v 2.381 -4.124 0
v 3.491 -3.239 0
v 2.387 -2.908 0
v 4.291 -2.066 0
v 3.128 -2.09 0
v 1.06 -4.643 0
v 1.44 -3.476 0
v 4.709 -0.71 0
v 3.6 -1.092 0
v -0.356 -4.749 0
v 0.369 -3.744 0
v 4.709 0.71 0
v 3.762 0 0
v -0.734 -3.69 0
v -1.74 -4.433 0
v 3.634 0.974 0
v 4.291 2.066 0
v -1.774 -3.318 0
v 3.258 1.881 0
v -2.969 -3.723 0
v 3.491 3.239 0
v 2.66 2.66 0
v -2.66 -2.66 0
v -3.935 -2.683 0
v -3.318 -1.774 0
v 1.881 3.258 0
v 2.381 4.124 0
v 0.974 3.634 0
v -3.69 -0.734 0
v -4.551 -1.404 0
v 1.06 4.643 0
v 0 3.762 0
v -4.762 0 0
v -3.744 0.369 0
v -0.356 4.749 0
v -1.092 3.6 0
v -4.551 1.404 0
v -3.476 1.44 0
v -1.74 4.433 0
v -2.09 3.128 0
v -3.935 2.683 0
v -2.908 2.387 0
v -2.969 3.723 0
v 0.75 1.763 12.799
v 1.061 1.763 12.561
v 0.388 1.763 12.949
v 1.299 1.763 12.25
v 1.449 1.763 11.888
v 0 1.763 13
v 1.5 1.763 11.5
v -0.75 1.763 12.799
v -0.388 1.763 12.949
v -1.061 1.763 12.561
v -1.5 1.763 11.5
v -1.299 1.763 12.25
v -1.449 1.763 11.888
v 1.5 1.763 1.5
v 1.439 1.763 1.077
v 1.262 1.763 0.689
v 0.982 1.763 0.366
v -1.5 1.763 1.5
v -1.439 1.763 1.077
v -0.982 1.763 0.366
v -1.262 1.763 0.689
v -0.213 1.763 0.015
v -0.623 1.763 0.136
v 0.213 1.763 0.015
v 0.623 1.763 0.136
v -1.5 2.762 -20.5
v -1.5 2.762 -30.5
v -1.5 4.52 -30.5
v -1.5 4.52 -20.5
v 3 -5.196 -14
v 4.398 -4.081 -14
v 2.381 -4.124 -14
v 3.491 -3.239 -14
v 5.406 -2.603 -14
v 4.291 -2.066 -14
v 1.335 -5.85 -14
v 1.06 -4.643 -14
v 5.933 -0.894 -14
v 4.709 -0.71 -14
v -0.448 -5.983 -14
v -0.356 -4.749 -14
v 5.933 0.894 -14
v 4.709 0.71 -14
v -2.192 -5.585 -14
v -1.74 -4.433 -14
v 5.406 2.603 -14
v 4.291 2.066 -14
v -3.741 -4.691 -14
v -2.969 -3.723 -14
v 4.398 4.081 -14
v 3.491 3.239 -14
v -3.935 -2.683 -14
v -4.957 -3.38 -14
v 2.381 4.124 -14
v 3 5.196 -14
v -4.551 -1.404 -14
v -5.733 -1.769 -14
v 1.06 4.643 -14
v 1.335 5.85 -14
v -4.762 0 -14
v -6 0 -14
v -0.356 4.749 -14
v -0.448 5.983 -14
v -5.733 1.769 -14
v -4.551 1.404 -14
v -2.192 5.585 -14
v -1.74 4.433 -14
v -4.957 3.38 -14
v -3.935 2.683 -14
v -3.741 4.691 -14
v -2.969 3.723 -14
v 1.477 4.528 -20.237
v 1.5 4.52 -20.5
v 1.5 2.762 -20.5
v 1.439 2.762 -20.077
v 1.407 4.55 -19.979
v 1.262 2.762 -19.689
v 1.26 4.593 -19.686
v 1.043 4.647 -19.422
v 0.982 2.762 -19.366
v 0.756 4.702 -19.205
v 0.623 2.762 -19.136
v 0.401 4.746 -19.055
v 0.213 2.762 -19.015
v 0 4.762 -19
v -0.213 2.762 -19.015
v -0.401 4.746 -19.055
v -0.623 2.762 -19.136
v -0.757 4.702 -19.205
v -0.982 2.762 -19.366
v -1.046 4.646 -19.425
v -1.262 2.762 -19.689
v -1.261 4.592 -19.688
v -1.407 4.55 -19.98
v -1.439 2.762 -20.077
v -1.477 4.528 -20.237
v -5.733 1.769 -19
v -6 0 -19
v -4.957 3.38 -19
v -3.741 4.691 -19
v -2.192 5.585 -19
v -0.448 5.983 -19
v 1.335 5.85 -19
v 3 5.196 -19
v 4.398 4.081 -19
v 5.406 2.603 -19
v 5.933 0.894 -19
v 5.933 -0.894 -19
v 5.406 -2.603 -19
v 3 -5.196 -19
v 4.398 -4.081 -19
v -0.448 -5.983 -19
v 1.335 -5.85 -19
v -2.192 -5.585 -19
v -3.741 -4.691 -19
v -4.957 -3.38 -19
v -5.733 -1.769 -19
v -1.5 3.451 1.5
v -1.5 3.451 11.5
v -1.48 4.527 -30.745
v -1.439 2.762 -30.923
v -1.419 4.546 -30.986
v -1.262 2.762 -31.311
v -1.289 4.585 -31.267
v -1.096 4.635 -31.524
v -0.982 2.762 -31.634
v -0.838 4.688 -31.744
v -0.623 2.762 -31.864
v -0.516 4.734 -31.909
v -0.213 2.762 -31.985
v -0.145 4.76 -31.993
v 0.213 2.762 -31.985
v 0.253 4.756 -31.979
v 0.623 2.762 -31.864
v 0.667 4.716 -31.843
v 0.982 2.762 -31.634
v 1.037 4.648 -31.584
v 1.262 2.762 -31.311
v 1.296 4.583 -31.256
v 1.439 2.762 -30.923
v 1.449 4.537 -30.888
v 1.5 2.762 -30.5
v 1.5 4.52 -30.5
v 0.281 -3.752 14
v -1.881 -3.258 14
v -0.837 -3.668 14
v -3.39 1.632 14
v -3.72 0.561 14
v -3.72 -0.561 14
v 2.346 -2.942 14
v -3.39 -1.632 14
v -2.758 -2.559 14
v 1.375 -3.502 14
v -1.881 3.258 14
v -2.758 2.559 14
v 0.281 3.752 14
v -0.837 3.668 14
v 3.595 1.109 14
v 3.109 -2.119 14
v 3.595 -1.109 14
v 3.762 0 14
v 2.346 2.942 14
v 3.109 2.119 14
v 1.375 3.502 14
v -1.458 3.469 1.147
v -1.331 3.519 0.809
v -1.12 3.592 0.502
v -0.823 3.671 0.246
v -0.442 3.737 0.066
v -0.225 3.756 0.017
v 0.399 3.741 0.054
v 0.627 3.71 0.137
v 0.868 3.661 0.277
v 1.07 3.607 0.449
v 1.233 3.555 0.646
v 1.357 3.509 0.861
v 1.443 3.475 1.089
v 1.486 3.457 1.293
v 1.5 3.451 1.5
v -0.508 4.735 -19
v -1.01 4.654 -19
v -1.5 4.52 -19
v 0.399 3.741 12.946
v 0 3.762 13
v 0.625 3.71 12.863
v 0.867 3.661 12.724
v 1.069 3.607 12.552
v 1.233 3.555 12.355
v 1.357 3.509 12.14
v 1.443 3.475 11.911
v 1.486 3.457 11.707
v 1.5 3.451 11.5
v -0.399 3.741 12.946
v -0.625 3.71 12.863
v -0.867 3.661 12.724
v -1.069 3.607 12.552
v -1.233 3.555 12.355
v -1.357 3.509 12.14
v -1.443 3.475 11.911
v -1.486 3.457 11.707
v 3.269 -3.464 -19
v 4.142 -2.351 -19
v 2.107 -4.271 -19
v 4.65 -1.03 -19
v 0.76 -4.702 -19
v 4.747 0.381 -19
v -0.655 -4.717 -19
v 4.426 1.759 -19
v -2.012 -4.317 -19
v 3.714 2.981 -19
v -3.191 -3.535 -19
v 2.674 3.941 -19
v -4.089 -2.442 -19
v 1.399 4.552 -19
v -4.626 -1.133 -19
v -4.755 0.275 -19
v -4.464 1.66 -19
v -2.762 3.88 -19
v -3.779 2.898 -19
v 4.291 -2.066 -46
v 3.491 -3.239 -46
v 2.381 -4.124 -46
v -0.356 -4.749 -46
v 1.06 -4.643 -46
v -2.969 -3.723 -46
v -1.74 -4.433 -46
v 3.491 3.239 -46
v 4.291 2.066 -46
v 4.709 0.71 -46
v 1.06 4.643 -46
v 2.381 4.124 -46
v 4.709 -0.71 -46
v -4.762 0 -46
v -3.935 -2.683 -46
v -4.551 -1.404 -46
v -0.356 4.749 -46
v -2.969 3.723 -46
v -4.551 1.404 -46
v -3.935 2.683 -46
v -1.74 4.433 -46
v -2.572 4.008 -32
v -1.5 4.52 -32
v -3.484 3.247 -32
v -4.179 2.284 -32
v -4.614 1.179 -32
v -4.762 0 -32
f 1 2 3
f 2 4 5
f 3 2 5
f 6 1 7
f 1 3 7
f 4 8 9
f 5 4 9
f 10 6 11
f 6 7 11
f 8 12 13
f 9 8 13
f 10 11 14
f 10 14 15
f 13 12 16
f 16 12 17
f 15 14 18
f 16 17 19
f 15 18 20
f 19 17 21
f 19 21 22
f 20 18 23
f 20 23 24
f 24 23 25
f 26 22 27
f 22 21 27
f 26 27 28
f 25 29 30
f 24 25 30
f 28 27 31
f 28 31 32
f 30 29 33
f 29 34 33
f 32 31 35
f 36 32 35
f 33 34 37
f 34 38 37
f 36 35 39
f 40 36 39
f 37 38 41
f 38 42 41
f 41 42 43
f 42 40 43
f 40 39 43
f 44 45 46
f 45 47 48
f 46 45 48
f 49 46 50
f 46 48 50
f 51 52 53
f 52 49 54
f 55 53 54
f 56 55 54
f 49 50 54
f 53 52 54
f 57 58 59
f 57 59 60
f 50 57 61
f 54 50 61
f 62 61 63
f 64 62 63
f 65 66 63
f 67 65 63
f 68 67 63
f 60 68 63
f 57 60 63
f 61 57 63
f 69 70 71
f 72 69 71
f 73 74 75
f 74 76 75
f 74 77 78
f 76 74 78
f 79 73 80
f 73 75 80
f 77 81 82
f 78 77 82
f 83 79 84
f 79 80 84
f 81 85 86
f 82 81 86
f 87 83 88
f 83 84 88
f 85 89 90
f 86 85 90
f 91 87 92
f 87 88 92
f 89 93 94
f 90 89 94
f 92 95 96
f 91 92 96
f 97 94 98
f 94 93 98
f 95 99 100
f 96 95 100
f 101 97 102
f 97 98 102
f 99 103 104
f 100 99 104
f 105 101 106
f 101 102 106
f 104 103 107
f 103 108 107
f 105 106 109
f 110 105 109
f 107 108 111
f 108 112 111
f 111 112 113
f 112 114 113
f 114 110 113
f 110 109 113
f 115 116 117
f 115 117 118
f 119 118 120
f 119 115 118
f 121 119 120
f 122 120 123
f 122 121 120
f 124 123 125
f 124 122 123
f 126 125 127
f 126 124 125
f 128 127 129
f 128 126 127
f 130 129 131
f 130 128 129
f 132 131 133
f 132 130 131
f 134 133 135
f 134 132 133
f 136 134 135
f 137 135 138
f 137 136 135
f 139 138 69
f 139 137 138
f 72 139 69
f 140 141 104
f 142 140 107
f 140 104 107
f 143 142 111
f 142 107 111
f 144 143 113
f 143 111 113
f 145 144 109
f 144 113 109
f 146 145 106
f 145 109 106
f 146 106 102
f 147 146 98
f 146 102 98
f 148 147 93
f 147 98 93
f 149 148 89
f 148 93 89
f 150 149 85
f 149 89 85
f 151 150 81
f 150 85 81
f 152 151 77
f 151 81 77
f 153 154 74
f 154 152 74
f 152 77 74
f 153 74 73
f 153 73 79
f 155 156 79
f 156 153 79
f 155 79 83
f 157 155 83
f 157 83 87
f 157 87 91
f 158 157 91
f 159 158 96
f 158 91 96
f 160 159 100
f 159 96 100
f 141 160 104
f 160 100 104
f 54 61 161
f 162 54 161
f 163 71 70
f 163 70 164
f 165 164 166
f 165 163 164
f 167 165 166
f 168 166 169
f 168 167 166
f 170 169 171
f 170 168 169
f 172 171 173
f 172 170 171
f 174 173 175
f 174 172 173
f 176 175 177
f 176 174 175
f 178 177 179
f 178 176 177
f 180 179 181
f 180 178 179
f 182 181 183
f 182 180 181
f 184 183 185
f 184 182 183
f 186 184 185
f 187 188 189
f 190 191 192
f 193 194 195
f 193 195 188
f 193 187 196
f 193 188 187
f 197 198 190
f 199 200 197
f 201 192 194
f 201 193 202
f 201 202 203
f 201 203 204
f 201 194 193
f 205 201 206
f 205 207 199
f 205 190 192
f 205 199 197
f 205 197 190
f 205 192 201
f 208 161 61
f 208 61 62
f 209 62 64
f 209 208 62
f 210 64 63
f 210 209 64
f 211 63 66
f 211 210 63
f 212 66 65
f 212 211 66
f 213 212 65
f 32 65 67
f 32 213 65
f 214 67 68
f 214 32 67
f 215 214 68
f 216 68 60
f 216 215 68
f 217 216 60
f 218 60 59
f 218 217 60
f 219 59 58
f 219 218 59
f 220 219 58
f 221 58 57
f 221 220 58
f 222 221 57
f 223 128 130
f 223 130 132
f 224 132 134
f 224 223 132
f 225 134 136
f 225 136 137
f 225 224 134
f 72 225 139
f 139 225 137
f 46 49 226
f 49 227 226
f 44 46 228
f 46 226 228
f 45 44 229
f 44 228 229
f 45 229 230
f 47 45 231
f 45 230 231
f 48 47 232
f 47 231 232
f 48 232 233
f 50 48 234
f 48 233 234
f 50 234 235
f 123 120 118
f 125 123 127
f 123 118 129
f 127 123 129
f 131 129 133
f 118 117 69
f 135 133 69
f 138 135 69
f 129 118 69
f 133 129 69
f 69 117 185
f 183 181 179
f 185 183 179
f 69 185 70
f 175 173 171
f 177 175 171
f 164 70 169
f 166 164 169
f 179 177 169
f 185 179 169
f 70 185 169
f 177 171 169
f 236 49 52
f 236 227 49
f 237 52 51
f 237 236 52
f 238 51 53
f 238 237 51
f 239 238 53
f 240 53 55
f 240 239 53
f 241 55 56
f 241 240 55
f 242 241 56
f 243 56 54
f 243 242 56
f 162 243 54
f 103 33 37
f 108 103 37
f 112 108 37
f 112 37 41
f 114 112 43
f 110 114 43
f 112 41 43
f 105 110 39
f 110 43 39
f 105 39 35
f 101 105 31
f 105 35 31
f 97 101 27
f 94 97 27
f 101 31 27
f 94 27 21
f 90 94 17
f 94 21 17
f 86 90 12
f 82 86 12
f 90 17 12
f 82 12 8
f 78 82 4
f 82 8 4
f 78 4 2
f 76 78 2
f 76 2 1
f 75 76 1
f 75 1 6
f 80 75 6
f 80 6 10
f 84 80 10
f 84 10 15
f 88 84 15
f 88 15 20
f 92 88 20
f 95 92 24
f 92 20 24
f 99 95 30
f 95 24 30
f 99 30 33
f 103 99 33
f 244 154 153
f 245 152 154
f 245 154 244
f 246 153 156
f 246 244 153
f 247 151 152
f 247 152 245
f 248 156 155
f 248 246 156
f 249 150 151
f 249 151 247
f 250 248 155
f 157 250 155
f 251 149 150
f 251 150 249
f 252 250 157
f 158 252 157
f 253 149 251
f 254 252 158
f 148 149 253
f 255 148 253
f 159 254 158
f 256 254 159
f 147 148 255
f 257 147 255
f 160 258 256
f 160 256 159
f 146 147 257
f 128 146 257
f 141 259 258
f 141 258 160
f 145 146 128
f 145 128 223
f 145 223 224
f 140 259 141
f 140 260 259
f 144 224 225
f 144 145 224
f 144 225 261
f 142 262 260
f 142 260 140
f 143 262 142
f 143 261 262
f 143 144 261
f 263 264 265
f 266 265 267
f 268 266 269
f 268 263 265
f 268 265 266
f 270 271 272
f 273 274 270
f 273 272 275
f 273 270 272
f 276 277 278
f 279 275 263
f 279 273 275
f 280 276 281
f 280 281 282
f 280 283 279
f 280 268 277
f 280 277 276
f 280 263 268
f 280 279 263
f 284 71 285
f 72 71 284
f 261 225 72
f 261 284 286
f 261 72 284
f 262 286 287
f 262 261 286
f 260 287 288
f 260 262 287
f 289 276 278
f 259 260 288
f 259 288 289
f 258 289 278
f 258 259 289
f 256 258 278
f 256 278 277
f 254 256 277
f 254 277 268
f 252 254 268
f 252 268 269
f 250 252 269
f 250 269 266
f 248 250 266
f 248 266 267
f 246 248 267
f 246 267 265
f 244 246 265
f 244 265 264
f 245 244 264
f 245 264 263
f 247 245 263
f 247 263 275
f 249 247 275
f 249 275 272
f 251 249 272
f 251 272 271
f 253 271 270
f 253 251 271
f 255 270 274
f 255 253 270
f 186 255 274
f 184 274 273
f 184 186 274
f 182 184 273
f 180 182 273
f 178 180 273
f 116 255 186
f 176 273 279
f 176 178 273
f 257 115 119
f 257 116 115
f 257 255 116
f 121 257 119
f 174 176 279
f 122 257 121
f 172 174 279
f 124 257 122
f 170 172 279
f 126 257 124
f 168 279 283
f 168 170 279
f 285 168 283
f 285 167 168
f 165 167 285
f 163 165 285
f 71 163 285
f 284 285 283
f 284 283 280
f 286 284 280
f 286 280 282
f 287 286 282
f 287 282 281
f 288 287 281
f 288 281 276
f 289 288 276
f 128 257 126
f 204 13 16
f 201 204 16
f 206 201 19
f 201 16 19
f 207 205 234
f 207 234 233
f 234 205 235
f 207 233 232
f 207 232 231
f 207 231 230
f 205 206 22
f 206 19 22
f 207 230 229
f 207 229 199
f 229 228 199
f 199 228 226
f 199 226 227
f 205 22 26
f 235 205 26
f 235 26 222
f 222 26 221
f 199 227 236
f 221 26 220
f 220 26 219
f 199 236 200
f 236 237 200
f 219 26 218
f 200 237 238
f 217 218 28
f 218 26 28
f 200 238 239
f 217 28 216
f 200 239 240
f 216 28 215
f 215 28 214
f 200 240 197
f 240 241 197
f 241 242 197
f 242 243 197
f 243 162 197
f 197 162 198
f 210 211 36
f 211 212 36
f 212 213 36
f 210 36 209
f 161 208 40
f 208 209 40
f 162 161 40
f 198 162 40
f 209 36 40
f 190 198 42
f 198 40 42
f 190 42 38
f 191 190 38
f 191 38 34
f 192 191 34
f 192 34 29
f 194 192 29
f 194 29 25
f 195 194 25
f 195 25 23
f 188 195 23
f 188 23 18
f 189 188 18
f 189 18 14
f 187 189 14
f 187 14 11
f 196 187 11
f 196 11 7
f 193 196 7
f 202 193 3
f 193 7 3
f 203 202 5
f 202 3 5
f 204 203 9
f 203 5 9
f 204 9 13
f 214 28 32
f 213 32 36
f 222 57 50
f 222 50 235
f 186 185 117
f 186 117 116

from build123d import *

# Parameters (mm, degrees)
SKETCH1_R               = 3.7625
PART1_DEPTH             = 14
SKETCH3_W               = 3
SKETCH3_H               = 4
KEYWAY1_DEPTH           = 13
SKETCH4_R               = 4.7625
PART2_BALLBEARING_DEPTH = 14
KEYWAY1_A_R             = 1.5
KEYWAY1_B_R             = 1.5
SKETCH6_R               = 6
PART3_DEPTH             = 5
SKETCH7_R               = 4.7625
PART4_DEPTH             = 13
SKETCH8_W               = 3
SKETCH8_H               = 4
KEYWAY2_DEPTH           = 13
SKETCH9_R               = 4.7625
PART5_BALLBEARING_DEPTH = 14
FILLET1_R               = 1.5
FILLET2_R               = 1.5


# Some blends are built 0.0001 mm under size
with BuildPart() as part:
    # Sketch1 → Part1 (new body)
    with BuildSketch(Plane.XY):
        Circle(SKETCH1_R)
    extrude(amount=PART1_DEPTH)

    # Sketch3 → Keyway1 (cut)
    with BuildSketch(Plane(origin=(0, 0, 0), x_dir=(-1, 0, 0), z_dir=(0, 0, -1))):
        with Locations((0, 3.7625)):
            Rectangle(SKETCH3_W, SKETCH3_H)
    extrude(amount=-KEYWAY1_DEPTH, mode=Mode.SUBTRACT)

    # Sketch4 → Part2_BallBearing (add)
    with BuildSketch(Plane(origin=(0, 0, 0), x_dir=(-1, 0, 0), z_dir=(0, 0, -1))):
        Circle(SKETCH4_R)
    extrude(amount=PART2_BALLBEARING_DEPTH)

    # Keyway1_a
    # the kernel refuses this fillet: 1.5 mm, written as the material it adds along each edge
    with BuildSketch(Plane(origin=(1.5, -1.9875, 0), x_dir=(-1, 0, 0), z_dir=(0, 1, 0))) as keyway1_a_piece_1_section:
        with BuildLine():
            CenterArc((KEYWAY1_A_R, KEYWAY1_A_R), KEYWAY1_A_R, 180, 90)
            Line((0, KEYWAY1_A_R), (0, 0))
            Line((0, 0), (KEYWAY1_A_R, 0))
        make_face()
    keyway1_a_piece_1 = extrude(amount=9.188066, mode=Mode.PRIVATE)
    keyway1_a_piece_1 = keyway1_a_piece_1 & Plane(origin=(0, 0, 0.327266), x_dir=(1, 0, 0), z_dir=(0, 0, -1)) * Cylinder(3.7625, 25, mode=Mode.PRIVATE)
    add(keyway1_a_piece_1)
    with BuildSketch(Plane(origin=(-1.5, 7.200566, 0), x_dir=(1, 0, 0), z_dir=(0, -1, 0))) as keyway1_a_piece_2_section:
        with BuildLine():
            CenterArc((KEYWAY1_A_R, KEYWAY1_A_R), KEYWAY1_A_R, 180, 90)
            Line((0, KEYWAY1_A_R), (0, 0))
            Line((0, 0), (KEYWAY1_A_R, 0))
        make_face()
    keyway1_a_piece_2 = extrude(amount=9.188066, mode=Mode.PRIVATE)
    keyway1_a_piece_2 = keyway1_a_piece_2 & Plane(origin=(0, 0, 0.327266), x_dir=(1, 0, 0), z_dir=(0, 0, -1)) * Cylinder(3.7625, 25, mode=Mode.PRIVATE)
    add(keyway1_a_piece_2)

    # Keyway1_b
    keyway1_b_edges = [part.edges().sort_by_distance(p)[0] for p in [
        (1.5, 2.606533, 13),
        (-1.5, 2.606533, 13),
    ]]
    fillet(keyway1_b_edges, radius=KEYWAY1_B_R - 0.0001)  # a hair under: the kernel refuses the full size

    # Sketch6 → Part3 (add)
    with BuildSketch(Plane(origin=(0, 0, -14), x_dir=(-1, 0, 0), z_dir=(0, 0, -1))):
        Circle(SKETCH6_R)
    extrude(amount=PART3_DEPTH)

    # Sketch7 → Part4 (add)
    with BuildSketch(Plane(origin=(0, 0, -19), x_dir=(-1, 0, 0), z_dir=(0, 0, -1))):
        Circle(SKETCH7_R)
    extrude(amount=PART4_DEPTH)

    # Sketch8 → KeyWay2 (cut)
    with BuildSketch(Plane(origin=(0, 0, -32), x_dir=(-1, 0, 0), z_dir=(0, 0, -1))):
        with Locations((0, 4.7625)):
            Rectangle(SKETCH8_W, SKETCH8_H)
    extrude(amount=-KEYWAY2_DEPTH, mode=Mode.SUBTRACT)

    # Sketch9 → Part5__BallBearing (add)
    with BuildSketch(Plane(origin=(0, 0, -32), x_dir=(-1, 0, 0), z_dir=(0, 0, -1))):
        Circle(SKETCH9_R)
    extrude(amount=PART5_BALLBEARING_DEPTH)

    # Fillet1
    # the kernel refuses this fillet: 1.5 mm, written as the material it adds along each edge
    with BuildSketch(Plane(origin=(1.5, -0.9875, -19), x_dir=(-1, 0, 0), z_dir=(0, 1, 0))) as fillet1_piece_1_section:
        with BuildLine():
            CenterArc((FILLET1_R, -FILLET1_R), FILLET1_R, 90, 90)
            Line((0, -FILLET1_R), (0, 0))
            Line((0, 0), (FILLET1_R, 0))
        make_face()
    fillet1_piece_1 = extrude(amount=9.257611, mode=Mode.PRIVATE)
    fillet1_piece_1 = fillet1_piece_1 & Plane(origin=(0, 0, -19.329162), x_dir=(-1, 0, 0), z_dir=(0, 0, 1)) * Cylinder(4.7625, 25, mode=Mode.PRIVATE)
    add(fillet1_piece_1)
    with BuildSketch(Plane(origin=(-1.5, 8.270111, -19), x_dir=(1, 0, 0), z_dir=(0, -1, 0))) as fillet1_piece_2_section:
        with BuildLine():
            CenterArc((FILLET1_R, -FILLET1_R), FILLET1_R, 90, 90)
            Line((0, -FILLET1_R), (0, 0))
            Line((0, 0), (FILLET1_R, 0))
        make_face()
    fillet1_piece_2 = extrude(amount=9.257611, mode=Mode.PRIVATE)
    fillet1_piece_2 = fillet1_piece_2 & Plane(origin=(0, 0, -19.329163), x_dir=(-1, 0, 0), z_dir=(0, 0, 1)) * Cylinder(4.7625, 25, mode=Mode.PRIVATE)
    add(fillet1_piece_2)

    # Fillet2
    # the kernel refuses this fillet: 1.5 mm, written as the material it adds along each edge
    with BuildSketch(Plane(origin=(1.5, -0.9875, -32), x_dir=(-1, 0, 0), z_dir=(0, 1, 0))) as fillet2_piece_1_section:
        with BuildLine():
            CenterArc((FILLET2_R, FILLET2_R), FILLET2_R, 180, 90)
            Line((0, FILLET2_R), (0, 0))
            Line((0, 0), (FILLET2_R, 0))
        make_face()
    fillet2_piece_1 = extrude(amount=9.257611, mode=Mode.PRIVATE)
    fillet2_piece_1 = fillet2_piece_1 & Plane(origin=(0, 0, -31.660407), x_dir=(-1, 0, 0), z_dir=(0, 0, 1)) * Cylinder(4.7625, 25, mode=Mode.PRIVATE)
    add(fillet2_piece_1)
    with BuildSketch(Plane(origin=(-1.5, 8.270111, -32), x_dir=(0, 0, 1), z_dir=(0, -1, 0))) as fillet2_piece_2_section:
        with BuildLine():
            CenterArc((FILLET2_R, -FILLET2_R), FILLET2_R, 90, 90)
            Line((0, -FILLET2_R), (0, 0))
            Line((0, 0), (FILLET2_R, 0))
        make_face()
    fillet2_piece_2 = extrude(amount=9.257611, mode=Mode.PRIVATE)
    fillet2_piece_2 = fillet2_piece_2 & Plane(origin=(0, 0, -31.668087), x_dir=(-1, 0, 0), z_dir=(0, 0, 1)) * Cylinder(4.7625, 25, mode=Mode.PRIVATE)
    add(fillet2_piece_2)


solid = part.part
